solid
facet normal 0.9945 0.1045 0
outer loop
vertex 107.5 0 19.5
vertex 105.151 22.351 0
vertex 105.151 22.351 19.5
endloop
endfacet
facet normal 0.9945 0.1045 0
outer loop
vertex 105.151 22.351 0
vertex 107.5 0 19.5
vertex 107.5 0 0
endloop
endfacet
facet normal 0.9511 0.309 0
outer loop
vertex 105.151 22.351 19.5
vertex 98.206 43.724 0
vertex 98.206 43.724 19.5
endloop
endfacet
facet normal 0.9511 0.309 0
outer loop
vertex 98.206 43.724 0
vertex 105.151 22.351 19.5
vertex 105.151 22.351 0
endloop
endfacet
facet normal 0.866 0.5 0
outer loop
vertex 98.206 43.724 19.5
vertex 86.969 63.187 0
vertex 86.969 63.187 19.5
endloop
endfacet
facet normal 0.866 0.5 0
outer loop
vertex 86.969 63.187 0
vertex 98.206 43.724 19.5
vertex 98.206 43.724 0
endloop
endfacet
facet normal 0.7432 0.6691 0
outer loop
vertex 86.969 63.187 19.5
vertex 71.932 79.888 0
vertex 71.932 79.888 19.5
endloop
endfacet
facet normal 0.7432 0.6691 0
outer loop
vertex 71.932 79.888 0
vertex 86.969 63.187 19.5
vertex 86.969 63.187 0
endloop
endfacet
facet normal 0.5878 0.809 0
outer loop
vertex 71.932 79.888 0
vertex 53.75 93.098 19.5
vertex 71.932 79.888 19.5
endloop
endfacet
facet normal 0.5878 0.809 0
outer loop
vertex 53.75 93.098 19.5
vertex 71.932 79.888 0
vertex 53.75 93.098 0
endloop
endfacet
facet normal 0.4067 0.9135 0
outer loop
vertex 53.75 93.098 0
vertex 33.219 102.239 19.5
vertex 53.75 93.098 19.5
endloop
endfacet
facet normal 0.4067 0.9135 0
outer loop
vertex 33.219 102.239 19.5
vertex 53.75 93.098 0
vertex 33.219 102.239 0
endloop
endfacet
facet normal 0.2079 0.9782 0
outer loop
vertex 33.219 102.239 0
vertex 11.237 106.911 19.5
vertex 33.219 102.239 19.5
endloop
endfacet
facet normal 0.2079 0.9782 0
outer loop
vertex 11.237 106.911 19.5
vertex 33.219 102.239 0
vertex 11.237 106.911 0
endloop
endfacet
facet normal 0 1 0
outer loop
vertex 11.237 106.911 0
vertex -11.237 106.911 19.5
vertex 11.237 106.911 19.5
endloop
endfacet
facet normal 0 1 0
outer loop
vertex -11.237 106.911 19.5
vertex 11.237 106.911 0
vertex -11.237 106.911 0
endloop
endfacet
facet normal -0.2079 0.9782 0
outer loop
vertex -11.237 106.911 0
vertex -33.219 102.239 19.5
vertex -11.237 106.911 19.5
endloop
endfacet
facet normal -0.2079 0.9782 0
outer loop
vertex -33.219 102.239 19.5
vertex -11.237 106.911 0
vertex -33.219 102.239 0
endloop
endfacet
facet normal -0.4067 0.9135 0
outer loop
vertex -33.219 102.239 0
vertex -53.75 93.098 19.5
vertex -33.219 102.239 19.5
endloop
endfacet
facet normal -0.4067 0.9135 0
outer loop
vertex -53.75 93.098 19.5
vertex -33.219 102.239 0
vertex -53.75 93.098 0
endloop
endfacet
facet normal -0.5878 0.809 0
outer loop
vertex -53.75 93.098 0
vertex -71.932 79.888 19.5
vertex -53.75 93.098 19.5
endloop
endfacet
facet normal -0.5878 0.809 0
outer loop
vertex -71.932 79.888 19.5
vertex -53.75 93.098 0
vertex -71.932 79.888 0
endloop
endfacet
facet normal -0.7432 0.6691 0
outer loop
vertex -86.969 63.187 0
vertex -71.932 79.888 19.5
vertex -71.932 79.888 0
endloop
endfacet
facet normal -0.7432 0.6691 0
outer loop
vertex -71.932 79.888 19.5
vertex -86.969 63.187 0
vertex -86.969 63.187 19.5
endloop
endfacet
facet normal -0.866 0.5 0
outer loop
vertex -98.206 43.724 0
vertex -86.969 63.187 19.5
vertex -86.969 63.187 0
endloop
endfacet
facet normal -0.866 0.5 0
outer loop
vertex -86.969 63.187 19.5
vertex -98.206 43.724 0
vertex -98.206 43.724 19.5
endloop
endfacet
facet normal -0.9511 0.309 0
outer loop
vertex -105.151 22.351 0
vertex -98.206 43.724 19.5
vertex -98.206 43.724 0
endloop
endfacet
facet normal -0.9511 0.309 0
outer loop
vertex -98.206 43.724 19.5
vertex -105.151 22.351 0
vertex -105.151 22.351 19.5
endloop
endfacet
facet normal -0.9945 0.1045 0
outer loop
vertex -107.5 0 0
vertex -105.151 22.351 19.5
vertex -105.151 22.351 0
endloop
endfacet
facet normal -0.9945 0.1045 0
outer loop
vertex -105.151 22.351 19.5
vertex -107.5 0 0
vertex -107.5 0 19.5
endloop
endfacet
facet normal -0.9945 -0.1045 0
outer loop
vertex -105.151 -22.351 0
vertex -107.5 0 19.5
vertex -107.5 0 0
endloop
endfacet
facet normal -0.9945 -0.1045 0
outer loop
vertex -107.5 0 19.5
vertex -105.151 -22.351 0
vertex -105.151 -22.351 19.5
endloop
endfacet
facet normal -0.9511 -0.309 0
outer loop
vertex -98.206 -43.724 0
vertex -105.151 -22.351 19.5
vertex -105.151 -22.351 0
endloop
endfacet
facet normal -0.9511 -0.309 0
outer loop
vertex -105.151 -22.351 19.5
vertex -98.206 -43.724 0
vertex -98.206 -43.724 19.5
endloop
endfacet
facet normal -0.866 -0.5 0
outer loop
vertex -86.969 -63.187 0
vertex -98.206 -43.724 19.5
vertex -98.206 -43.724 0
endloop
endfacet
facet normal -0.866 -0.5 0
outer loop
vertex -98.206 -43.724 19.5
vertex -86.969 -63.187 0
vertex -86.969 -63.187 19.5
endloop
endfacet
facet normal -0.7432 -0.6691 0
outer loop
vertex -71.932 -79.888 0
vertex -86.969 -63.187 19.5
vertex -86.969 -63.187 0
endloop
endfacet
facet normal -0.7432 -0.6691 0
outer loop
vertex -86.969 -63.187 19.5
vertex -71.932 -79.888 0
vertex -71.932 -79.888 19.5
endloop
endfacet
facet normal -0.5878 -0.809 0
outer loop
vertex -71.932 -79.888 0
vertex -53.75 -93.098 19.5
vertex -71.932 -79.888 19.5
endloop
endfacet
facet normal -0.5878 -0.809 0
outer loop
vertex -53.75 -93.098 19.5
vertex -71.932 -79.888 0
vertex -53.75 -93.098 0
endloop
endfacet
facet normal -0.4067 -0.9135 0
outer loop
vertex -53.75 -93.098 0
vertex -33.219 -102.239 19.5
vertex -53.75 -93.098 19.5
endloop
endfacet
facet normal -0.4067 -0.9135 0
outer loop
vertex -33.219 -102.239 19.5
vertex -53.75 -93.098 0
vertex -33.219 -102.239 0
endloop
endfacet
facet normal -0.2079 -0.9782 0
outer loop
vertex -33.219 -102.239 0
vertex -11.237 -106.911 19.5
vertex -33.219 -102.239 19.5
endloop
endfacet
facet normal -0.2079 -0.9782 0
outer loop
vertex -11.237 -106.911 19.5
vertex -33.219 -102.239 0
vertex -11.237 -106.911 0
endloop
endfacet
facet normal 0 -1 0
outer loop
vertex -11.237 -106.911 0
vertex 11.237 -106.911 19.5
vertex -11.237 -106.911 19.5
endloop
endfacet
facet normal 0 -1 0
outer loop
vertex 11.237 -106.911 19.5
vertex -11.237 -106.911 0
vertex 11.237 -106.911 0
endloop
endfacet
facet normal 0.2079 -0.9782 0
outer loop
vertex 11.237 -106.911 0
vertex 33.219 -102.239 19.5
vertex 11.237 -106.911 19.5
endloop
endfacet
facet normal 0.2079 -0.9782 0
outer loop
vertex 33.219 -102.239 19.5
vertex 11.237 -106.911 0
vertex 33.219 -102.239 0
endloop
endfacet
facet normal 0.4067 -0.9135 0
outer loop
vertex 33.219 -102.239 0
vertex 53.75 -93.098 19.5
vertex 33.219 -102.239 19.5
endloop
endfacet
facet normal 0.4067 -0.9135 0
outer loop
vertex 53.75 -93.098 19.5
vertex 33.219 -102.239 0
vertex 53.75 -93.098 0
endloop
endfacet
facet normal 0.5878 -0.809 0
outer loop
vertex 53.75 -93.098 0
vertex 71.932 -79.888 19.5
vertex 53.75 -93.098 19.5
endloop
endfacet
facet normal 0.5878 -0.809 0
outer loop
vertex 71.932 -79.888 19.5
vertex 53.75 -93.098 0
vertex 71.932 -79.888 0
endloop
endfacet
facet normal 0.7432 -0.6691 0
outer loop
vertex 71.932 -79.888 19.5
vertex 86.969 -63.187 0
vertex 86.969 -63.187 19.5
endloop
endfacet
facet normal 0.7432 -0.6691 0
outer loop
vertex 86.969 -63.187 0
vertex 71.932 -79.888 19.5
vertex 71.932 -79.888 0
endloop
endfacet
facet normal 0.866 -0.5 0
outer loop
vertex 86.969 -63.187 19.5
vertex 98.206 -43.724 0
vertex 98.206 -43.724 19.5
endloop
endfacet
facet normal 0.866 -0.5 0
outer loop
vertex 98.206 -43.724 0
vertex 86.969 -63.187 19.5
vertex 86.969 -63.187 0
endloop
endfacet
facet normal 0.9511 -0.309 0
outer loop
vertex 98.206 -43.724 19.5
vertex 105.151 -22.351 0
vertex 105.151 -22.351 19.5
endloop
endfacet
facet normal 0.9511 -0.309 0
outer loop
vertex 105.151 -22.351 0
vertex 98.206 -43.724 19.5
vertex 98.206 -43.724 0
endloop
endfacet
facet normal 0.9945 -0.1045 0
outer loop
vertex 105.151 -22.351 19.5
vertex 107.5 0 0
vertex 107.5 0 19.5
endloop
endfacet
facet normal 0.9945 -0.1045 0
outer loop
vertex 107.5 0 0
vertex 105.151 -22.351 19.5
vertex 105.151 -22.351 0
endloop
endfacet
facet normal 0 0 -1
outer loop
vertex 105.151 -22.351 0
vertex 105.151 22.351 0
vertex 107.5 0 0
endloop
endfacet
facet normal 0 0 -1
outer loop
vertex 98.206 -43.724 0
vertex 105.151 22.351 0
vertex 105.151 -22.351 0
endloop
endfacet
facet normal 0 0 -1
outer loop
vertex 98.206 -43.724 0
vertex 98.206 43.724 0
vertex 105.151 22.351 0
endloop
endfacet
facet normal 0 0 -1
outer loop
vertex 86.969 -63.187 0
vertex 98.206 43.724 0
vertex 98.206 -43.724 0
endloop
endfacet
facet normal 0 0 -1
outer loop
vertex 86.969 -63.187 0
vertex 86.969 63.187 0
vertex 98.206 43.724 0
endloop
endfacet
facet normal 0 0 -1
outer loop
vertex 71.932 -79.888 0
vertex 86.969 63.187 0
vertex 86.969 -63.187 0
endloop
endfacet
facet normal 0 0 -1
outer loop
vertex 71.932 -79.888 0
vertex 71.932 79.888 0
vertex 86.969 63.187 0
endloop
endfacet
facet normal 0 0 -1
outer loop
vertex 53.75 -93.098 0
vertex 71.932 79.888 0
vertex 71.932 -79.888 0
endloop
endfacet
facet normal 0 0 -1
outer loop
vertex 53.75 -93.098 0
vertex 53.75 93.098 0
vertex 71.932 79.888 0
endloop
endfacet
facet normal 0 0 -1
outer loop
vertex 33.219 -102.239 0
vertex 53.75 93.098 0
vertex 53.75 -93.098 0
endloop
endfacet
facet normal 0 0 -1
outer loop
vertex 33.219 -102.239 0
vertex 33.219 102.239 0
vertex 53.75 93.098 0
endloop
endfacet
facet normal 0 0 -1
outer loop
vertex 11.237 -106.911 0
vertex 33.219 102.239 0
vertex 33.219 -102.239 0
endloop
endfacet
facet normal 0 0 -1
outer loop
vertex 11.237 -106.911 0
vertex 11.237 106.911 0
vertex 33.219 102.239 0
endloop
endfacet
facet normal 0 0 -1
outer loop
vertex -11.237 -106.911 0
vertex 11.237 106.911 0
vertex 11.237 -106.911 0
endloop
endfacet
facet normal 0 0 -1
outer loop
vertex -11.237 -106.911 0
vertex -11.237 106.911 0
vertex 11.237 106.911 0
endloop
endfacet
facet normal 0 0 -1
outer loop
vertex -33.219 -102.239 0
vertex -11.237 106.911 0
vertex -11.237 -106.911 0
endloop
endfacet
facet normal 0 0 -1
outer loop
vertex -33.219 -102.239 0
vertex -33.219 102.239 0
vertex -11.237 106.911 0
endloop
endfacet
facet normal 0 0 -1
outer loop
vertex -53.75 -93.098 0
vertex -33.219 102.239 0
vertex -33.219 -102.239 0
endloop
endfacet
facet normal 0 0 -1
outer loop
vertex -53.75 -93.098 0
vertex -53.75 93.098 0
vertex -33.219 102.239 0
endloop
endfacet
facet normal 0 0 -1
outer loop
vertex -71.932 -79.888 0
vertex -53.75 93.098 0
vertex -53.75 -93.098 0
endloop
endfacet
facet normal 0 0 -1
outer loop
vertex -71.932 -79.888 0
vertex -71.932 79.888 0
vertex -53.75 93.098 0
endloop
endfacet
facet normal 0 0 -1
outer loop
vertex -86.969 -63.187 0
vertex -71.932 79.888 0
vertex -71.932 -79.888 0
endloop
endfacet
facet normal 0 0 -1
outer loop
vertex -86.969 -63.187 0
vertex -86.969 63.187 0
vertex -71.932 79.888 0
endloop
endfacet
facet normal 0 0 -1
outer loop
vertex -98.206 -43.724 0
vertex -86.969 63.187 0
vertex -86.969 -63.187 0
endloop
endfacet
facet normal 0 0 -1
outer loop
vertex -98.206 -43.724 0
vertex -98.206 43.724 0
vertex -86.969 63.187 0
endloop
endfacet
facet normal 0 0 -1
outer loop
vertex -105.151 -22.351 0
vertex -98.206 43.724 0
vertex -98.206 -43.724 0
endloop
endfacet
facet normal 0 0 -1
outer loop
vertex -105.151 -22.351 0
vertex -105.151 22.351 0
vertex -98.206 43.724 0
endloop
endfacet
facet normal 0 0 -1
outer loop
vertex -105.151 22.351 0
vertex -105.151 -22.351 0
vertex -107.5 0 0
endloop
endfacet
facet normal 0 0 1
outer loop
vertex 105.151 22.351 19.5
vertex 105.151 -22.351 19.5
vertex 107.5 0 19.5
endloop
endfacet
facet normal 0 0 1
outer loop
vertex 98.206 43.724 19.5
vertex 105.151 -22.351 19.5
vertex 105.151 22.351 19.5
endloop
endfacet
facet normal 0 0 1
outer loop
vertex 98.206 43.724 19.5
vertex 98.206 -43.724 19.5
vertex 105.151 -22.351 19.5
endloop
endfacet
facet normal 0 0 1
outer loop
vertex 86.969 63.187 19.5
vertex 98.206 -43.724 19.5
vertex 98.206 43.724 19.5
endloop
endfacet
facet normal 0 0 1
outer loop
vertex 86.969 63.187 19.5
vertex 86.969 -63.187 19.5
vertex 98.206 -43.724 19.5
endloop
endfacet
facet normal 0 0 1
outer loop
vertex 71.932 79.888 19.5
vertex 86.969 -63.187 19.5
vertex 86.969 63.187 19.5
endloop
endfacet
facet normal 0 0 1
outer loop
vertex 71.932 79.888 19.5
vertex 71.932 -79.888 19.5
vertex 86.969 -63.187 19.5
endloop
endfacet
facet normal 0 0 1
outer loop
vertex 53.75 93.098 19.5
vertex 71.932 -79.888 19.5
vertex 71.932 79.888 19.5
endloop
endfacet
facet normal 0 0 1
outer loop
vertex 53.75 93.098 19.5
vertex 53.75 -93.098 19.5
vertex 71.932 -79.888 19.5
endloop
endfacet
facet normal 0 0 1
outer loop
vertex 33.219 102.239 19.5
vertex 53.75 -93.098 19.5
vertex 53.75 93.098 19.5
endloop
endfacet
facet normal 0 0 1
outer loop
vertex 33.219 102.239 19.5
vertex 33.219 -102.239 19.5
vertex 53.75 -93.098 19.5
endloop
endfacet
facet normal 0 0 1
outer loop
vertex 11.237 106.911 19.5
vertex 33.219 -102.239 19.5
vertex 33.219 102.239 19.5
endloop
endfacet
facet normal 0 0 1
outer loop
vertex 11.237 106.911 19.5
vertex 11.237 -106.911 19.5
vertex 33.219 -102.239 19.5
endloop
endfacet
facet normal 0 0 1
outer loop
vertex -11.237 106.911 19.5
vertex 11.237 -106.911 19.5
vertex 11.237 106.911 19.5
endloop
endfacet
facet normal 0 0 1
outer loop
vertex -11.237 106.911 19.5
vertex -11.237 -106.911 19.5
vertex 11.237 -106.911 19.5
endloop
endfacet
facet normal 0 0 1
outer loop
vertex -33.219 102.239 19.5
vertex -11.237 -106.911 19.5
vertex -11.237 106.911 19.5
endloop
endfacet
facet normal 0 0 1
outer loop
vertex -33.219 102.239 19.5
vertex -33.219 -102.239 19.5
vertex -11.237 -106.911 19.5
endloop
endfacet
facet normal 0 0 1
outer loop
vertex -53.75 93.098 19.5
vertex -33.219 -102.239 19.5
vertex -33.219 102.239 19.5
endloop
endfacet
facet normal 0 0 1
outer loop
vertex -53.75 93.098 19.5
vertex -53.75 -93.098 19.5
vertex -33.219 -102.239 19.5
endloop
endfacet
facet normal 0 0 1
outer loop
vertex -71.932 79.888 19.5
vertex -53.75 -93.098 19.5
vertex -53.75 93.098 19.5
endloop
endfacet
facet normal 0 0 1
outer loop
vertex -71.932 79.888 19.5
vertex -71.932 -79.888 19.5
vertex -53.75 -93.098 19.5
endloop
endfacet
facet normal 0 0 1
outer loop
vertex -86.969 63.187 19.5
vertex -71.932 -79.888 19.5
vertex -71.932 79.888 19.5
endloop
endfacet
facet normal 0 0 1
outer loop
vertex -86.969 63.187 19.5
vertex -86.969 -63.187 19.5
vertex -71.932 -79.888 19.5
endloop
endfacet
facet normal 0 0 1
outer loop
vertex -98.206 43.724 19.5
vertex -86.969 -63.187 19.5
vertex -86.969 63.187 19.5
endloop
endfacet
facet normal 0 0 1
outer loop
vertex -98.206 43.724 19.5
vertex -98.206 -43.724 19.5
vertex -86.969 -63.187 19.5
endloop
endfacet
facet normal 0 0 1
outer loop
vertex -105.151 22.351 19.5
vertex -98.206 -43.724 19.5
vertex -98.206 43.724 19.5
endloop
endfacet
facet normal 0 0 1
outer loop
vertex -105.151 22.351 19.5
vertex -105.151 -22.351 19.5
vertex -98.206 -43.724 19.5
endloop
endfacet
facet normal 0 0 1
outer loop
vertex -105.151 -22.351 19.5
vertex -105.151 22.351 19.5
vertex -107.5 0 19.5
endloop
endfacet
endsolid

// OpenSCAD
echo(version=version());

// Bed settings
BED_WIDTH = 50;
BED_HEIGHT = 5;

// Bearing settings
BEARING_DIAMETER_INNER = 8.15;
BEARING_DIAMETER_OUTTER = 21.5;
BERING_HEIGHT = 6.5;

// Plate settings
PLATE_DIAMETER = BED_WIDTH / 2;
PLATE_HEIGHT = BED_HEIGHT; // 10;

// Helper function for ring
module ring(height = 1, outter_diameter = 10, inner_diameter = 5, de = 0.1) {
    difference() {
        cylinder(h = height, r = outter_diameter / 2);
        translate([0, 0, - de]) 
        cylinder(h = height + 2 * de, r = inner_diameter / 2, false);
    }
}
// Stand
module photogametry_stand() { 
    // Bed
    cube(size = [BED_WIDTH, BED_WIDTH, BED_HEIGHT], center = true);
    
    // Pylon
    pylon_height = BERING_HEIGHT * 3 + BED_HEIGHT;
    cylinder(pylon_height, BEARING_DIAMETER_INNER / 2 * 1.1,  BEARING_DIAMETER_OUTTER / 2, center = false);
   
    // Plate
    // translate([100, 100, 1000]);
    // cylinder(10, 10, center = false);
    // ring(BERING_HEIGHT, BEARING_DIAMETER_OUTTER * 2, BEARING_DIAMETER_OUTTER, 100);
}

// Top plate
module photogametry_plate() {
    // difference() {
    // }
    
    // cylinder(h = height, r = BEARING_DIAMETER_OUTTER / 2, 1);
    // ring(BERING_HEIGHT, BEARING_DIAMETER_OUTTER * 2, BEARING_DIAMETER_OUTTER, 100);
    
    // cylinder(2 * BEARING_HEIGHT,  BEARING_DIAMETER_OUTTER / 2, false);
    cylinder(BERING_HEIGHT * 3, BEARING_DIAMETER_OUTTER * 5, BEARING_DIAMETER_OUTTER * 5);
} 

// Main object
module main() {
    // Stand
    // photogametry_stand();
    
    // Top plate
    photogametry_plate();
}

// Render main object
main();
